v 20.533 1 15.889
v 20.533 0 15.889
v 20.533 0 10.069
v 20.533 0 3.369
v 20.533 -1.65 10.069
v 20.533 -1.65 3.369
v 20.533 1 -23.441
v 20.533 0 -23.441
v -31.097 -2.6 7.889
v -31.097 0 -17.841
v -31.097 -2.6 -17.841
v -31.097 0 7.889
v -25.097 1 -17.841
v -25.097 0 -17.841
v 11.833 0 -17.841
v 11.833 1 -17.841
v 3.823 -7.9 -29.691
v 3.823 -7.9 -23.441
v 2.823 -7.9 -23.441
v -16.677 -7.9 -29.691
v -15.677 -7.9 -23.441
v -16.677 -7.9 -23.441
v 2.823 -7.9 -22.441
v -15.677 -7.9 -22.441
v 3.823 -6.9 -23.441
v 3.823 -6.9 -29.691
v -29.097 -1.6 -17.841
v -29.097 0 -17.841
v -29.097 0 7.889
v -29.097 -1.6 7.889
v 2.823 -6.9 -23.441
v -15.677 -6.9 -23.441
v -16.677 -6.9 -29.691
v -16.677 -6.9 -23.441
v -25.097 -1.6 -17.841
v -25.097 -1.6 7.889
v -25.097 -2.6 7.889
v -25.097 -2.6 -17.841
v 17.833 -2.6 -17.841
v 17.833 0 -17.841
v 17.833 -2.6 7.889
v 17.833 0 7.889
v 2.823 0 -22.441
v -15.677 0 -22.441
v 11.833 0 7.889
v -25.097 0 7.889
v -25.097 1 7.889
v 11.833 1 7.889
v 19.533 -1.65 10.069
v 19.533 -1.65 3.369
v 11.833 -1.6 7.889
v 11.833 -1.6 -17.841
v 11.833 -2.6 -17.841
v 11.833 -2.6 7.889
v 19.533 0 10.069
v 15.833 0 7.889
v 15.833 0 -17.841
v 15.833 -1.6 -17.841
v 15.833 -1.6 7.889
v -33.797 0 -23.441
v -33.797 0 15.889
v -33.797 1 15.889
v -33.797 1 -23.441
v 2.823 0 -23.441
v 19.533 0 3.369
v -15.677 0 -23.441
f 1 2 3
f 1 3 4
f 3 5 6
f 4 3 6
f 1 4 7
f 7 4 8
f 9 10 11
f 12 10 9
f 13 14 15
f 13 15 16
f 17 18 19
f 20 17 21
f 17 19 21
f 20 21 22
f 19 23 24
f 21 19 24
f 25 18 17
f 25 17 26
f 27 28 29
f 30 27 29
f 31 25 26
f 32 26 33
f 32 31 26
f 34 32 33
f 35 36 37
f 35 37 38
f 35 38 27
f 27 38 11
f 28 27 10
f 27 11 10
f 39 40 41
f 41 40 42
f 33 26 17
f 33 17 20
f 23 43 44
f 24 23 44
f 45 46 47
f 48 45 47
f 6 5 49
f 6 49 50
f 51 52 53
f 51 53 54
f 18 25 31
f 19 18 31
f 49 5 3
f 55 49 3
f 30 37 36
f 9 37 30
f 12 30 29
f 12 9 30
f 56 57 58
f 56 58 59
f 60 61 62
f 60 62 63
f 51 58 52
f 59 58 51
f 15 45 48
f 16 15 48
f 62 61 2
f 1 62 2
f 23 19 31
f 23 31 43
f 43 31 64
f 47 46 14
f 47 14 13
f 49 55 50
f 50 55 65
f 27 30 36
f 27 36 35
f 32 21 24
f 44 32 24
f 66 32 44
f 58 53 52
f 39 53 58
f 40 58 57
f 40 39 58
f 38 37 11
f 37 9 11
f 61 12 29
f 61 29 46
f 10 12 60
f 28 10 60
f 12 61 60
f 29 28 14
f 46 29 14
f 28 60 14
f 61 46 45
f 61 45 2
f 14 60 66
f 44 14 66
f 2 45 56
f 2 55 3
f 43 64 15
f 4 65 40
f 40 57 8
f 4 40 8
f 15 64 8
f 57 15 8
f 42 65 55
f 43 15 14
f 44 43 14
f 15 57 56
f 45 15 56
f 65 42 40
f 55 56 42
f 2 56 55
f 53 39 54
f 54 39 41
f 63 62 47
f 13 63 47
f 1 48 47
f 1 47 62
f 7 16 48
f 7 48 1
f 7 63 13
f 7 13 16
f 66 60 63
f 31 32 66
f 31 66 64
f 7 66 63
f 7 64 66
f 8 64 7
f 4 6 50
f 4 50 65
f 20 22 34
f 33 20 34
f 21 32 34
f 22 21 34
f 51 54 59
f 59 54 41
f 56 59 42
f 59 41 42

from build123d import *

# Parameters (mm, degrees)
SKETCH1_W            = 54.33
SKETCH1_H            = 39.33
BOSS_EXTRUDE1_DEPTH  = 1
SKETCH2_W            = 6.7
SKETCH2_H            = 1.65
BOSS_EXTRUDE2_DEPTH  = 1
SKETCH3_W            = 20.51
SKETCH3_H            = 4.6
BOSS_EXTRUDE3_DEPTH  = 1
SKETCH5_W            = 50.087359313
SKETCH5_H            = 35.087359313
CUT_EXTRUDE1_DEPTH   = 11
SKETCH6_W            = 18.5
SKETCH6_H            = 7.9
BOSS_EXTRUDE5_DEPTH  = 1
SKETCH7_W            = 20.51
SKETCH7_H            = 1
CUT_EXTRUDE3_DEPTH   = 4.6
SKETCH10_W           = 8
SKETCH10_H           = 1
SKETCH10_W_2         = 5.6
BOSS_EXTRUDE8_DEPTH  = 54.33
SKETCH11_W           = 8.7
SKETCH11_H           = 1
BOSS_EXTRUDE9_DEPTH  = 39.33
SKETCH12_W           = 20.5
SKETCH12_H           = 1
BOSS_EXTRUDE10_DEPTH = 6.25
SKETCH13_W           = 2
SKETCH13_H           = 25.73
BOSS_EXTRUDE14_DEPTH = 2.6
SKETCH16_W           = 25.73
SKETCH16_H           = 1
BOSS_EXTRUDE15_DEPTH = 4
SKETCH17_W           = 25.73
SKETCH17_H           = 1
BOSS_EXTRUDE16_DEPTH = 4


with BuildPart() as part:
    # Sketch1 → Boss-Extrude1 (new body)
    with BuildSketch(Plane(origin=(0, 0, 0), x_dir=(1, 0, 0), z_dir=(0, 1, 0))):
        with Locations((-6.631882129, 3.775979087)):
            Rectangle(SKETCH1_W, SKETCH1_H)
    extrude(amount=BOSS_EXTRUDE1_DEPTH)

    # Sketch2 → Boss-Extrude2 (add)
    with BuildSketch(Plane(origin=(20.533117871, 0, 0), x_dir=(0, 0, -1), z_dir=(1, 0, 0))):
        with Locations((-6.719020913, -0.825)):
            Rectangle(SKETCH2_W, SKETCH2_H)
    extrude(amount=-BOSS_EXTRUDE2_DEPTH)

    # Sketch3 → Boss-Extrude3 (add)
    with BuildSketch(Plane.XY.offset(15.889020913)):
        with Locations((-6.431882129, -2.3)):
            Rectangle(SKETCH3_W, SKETCH3_H)
    extrude(amount=-BOSS_EXTRUDE3_DEPTH)

    # Sketch5 → Cut-Extrude1 (cut)
    with BuildSketch(Plane(origin=(0, 1, 0), x_dir=(1, 0, 0), z_dir=(0, 1, 0))):
        with Locations((-6.63188213, 3.775979088)):
            Rectangle(SKETCH5_W, SKETCH5_H)
    extrude(amount=-CUT_EXTRUDE1_DEPTH, mode=Mode.SUBTRACT)

    # Sketch6 → Boss-Extrude5 (add)
    with BuildSketch(Plane(origin=(0, 0, -23.440979087), x_dir=(-1, 0, 0), z_dir=(0, 0, -1))):
        with Locations((6.426882129, -3.95)):
            Rectangle(SKETCH6_W, SKETCH6_H)
    extrude(amount=-BOSS_EXTRUDE5_DEPTH)

    # Sketch7 → Cut-Extrude3 (cut)
    with BuildSketch(Plane.XZ.offset(4.6)):
        with Locations((-6.431882129, 15.389020913)):
            Rectangle(SKETCH7_W, SKETCH7_H)
    extrude(amount=-CUT_EXTRUDE3_DEPTH, mode=Mode.SUBTRACT)

    # Sketch10 → Boss-Extrude8 (add)
    with BuildSketch(Plane.ZY.offset(33.796882129)):
        with Locations((11.889020913, 0.5)):
            Rectangle(SKETCH10_W, SKETCH10_H)
        with Locations((-20.640979087, 0.5)):
            Rectangle(SKETCH10_W_2, SKETCH10_H)
    extrude(amount=-BOSS_EXTRUDE8_DEPTH)

    # Sketch11 → Boss-Extrude9 (add)
    with BuildSketch(Plane.XY.offset(15.889020913)):
        with Locations((16.183117871, 0.5)):
            Rectangle(SKETCH11_W, SKETCH11_H)
        with Locations((-29.446882129, 0.5)):
            Rectangle(SKETCH11_W, SKETCH11_H)
    extrude(amount=-BOSS_EXTRUDE9_DEPTH)

    # Sketch12 → Boss-Extrude10 (add)
    with BuildSketch(Plane(origin=(0, 0, -23.440979087), x_dir=(-1, 0, 0), z_dir=(0, 0, -1))):
        with Locations((6.426882129, -7.4)):
            Rectangle(SKETCH12_W, SKETCH12_H)
    extrude(amount=BOSS_EXTRUDE10_DEPTH)

    # Sketch13 → Boss-Extrude14 (add)
    with BuildSketch(Plane.XZ):
        with Locations((16.833117871, -4.975979087)):
            Rectangle(SKETCH13_W, SKETCH13_H)
        with Locations((-30.096882129, -4.975979087)):
            Rectangle(SKETCH13_W, SKETCH13_H)
    extrude(amount=BOSS_EXTRUDE14_DEPTH)

    # Sketch16 → Boss-Extrude15 (add)
    with BuildSketch(Plane.ZY.offset(-15.833117871)):
        with Locations((-4.975979087, -2.1)):
            Rectangle(SKETCH16_W, SKETCH16_H)
    extrude(amount=BOSS_EXTRUDE15_DEPTH)

    # Sketch17 → Boss-Extrude16 (add)
    with BuildSketch(Plane(origin=(-29.096882129, 0, 0), x_dir=(0, 0, -1), z_dir=(1, 0, 0))):
        with Locations((4.975979087, -2.1)):
            Rectangle(SKETCH17_W, SKETCH17_H)
    extrude(amount=BOSS_EXTRUDE16_DEPTH)


solid = part.part
